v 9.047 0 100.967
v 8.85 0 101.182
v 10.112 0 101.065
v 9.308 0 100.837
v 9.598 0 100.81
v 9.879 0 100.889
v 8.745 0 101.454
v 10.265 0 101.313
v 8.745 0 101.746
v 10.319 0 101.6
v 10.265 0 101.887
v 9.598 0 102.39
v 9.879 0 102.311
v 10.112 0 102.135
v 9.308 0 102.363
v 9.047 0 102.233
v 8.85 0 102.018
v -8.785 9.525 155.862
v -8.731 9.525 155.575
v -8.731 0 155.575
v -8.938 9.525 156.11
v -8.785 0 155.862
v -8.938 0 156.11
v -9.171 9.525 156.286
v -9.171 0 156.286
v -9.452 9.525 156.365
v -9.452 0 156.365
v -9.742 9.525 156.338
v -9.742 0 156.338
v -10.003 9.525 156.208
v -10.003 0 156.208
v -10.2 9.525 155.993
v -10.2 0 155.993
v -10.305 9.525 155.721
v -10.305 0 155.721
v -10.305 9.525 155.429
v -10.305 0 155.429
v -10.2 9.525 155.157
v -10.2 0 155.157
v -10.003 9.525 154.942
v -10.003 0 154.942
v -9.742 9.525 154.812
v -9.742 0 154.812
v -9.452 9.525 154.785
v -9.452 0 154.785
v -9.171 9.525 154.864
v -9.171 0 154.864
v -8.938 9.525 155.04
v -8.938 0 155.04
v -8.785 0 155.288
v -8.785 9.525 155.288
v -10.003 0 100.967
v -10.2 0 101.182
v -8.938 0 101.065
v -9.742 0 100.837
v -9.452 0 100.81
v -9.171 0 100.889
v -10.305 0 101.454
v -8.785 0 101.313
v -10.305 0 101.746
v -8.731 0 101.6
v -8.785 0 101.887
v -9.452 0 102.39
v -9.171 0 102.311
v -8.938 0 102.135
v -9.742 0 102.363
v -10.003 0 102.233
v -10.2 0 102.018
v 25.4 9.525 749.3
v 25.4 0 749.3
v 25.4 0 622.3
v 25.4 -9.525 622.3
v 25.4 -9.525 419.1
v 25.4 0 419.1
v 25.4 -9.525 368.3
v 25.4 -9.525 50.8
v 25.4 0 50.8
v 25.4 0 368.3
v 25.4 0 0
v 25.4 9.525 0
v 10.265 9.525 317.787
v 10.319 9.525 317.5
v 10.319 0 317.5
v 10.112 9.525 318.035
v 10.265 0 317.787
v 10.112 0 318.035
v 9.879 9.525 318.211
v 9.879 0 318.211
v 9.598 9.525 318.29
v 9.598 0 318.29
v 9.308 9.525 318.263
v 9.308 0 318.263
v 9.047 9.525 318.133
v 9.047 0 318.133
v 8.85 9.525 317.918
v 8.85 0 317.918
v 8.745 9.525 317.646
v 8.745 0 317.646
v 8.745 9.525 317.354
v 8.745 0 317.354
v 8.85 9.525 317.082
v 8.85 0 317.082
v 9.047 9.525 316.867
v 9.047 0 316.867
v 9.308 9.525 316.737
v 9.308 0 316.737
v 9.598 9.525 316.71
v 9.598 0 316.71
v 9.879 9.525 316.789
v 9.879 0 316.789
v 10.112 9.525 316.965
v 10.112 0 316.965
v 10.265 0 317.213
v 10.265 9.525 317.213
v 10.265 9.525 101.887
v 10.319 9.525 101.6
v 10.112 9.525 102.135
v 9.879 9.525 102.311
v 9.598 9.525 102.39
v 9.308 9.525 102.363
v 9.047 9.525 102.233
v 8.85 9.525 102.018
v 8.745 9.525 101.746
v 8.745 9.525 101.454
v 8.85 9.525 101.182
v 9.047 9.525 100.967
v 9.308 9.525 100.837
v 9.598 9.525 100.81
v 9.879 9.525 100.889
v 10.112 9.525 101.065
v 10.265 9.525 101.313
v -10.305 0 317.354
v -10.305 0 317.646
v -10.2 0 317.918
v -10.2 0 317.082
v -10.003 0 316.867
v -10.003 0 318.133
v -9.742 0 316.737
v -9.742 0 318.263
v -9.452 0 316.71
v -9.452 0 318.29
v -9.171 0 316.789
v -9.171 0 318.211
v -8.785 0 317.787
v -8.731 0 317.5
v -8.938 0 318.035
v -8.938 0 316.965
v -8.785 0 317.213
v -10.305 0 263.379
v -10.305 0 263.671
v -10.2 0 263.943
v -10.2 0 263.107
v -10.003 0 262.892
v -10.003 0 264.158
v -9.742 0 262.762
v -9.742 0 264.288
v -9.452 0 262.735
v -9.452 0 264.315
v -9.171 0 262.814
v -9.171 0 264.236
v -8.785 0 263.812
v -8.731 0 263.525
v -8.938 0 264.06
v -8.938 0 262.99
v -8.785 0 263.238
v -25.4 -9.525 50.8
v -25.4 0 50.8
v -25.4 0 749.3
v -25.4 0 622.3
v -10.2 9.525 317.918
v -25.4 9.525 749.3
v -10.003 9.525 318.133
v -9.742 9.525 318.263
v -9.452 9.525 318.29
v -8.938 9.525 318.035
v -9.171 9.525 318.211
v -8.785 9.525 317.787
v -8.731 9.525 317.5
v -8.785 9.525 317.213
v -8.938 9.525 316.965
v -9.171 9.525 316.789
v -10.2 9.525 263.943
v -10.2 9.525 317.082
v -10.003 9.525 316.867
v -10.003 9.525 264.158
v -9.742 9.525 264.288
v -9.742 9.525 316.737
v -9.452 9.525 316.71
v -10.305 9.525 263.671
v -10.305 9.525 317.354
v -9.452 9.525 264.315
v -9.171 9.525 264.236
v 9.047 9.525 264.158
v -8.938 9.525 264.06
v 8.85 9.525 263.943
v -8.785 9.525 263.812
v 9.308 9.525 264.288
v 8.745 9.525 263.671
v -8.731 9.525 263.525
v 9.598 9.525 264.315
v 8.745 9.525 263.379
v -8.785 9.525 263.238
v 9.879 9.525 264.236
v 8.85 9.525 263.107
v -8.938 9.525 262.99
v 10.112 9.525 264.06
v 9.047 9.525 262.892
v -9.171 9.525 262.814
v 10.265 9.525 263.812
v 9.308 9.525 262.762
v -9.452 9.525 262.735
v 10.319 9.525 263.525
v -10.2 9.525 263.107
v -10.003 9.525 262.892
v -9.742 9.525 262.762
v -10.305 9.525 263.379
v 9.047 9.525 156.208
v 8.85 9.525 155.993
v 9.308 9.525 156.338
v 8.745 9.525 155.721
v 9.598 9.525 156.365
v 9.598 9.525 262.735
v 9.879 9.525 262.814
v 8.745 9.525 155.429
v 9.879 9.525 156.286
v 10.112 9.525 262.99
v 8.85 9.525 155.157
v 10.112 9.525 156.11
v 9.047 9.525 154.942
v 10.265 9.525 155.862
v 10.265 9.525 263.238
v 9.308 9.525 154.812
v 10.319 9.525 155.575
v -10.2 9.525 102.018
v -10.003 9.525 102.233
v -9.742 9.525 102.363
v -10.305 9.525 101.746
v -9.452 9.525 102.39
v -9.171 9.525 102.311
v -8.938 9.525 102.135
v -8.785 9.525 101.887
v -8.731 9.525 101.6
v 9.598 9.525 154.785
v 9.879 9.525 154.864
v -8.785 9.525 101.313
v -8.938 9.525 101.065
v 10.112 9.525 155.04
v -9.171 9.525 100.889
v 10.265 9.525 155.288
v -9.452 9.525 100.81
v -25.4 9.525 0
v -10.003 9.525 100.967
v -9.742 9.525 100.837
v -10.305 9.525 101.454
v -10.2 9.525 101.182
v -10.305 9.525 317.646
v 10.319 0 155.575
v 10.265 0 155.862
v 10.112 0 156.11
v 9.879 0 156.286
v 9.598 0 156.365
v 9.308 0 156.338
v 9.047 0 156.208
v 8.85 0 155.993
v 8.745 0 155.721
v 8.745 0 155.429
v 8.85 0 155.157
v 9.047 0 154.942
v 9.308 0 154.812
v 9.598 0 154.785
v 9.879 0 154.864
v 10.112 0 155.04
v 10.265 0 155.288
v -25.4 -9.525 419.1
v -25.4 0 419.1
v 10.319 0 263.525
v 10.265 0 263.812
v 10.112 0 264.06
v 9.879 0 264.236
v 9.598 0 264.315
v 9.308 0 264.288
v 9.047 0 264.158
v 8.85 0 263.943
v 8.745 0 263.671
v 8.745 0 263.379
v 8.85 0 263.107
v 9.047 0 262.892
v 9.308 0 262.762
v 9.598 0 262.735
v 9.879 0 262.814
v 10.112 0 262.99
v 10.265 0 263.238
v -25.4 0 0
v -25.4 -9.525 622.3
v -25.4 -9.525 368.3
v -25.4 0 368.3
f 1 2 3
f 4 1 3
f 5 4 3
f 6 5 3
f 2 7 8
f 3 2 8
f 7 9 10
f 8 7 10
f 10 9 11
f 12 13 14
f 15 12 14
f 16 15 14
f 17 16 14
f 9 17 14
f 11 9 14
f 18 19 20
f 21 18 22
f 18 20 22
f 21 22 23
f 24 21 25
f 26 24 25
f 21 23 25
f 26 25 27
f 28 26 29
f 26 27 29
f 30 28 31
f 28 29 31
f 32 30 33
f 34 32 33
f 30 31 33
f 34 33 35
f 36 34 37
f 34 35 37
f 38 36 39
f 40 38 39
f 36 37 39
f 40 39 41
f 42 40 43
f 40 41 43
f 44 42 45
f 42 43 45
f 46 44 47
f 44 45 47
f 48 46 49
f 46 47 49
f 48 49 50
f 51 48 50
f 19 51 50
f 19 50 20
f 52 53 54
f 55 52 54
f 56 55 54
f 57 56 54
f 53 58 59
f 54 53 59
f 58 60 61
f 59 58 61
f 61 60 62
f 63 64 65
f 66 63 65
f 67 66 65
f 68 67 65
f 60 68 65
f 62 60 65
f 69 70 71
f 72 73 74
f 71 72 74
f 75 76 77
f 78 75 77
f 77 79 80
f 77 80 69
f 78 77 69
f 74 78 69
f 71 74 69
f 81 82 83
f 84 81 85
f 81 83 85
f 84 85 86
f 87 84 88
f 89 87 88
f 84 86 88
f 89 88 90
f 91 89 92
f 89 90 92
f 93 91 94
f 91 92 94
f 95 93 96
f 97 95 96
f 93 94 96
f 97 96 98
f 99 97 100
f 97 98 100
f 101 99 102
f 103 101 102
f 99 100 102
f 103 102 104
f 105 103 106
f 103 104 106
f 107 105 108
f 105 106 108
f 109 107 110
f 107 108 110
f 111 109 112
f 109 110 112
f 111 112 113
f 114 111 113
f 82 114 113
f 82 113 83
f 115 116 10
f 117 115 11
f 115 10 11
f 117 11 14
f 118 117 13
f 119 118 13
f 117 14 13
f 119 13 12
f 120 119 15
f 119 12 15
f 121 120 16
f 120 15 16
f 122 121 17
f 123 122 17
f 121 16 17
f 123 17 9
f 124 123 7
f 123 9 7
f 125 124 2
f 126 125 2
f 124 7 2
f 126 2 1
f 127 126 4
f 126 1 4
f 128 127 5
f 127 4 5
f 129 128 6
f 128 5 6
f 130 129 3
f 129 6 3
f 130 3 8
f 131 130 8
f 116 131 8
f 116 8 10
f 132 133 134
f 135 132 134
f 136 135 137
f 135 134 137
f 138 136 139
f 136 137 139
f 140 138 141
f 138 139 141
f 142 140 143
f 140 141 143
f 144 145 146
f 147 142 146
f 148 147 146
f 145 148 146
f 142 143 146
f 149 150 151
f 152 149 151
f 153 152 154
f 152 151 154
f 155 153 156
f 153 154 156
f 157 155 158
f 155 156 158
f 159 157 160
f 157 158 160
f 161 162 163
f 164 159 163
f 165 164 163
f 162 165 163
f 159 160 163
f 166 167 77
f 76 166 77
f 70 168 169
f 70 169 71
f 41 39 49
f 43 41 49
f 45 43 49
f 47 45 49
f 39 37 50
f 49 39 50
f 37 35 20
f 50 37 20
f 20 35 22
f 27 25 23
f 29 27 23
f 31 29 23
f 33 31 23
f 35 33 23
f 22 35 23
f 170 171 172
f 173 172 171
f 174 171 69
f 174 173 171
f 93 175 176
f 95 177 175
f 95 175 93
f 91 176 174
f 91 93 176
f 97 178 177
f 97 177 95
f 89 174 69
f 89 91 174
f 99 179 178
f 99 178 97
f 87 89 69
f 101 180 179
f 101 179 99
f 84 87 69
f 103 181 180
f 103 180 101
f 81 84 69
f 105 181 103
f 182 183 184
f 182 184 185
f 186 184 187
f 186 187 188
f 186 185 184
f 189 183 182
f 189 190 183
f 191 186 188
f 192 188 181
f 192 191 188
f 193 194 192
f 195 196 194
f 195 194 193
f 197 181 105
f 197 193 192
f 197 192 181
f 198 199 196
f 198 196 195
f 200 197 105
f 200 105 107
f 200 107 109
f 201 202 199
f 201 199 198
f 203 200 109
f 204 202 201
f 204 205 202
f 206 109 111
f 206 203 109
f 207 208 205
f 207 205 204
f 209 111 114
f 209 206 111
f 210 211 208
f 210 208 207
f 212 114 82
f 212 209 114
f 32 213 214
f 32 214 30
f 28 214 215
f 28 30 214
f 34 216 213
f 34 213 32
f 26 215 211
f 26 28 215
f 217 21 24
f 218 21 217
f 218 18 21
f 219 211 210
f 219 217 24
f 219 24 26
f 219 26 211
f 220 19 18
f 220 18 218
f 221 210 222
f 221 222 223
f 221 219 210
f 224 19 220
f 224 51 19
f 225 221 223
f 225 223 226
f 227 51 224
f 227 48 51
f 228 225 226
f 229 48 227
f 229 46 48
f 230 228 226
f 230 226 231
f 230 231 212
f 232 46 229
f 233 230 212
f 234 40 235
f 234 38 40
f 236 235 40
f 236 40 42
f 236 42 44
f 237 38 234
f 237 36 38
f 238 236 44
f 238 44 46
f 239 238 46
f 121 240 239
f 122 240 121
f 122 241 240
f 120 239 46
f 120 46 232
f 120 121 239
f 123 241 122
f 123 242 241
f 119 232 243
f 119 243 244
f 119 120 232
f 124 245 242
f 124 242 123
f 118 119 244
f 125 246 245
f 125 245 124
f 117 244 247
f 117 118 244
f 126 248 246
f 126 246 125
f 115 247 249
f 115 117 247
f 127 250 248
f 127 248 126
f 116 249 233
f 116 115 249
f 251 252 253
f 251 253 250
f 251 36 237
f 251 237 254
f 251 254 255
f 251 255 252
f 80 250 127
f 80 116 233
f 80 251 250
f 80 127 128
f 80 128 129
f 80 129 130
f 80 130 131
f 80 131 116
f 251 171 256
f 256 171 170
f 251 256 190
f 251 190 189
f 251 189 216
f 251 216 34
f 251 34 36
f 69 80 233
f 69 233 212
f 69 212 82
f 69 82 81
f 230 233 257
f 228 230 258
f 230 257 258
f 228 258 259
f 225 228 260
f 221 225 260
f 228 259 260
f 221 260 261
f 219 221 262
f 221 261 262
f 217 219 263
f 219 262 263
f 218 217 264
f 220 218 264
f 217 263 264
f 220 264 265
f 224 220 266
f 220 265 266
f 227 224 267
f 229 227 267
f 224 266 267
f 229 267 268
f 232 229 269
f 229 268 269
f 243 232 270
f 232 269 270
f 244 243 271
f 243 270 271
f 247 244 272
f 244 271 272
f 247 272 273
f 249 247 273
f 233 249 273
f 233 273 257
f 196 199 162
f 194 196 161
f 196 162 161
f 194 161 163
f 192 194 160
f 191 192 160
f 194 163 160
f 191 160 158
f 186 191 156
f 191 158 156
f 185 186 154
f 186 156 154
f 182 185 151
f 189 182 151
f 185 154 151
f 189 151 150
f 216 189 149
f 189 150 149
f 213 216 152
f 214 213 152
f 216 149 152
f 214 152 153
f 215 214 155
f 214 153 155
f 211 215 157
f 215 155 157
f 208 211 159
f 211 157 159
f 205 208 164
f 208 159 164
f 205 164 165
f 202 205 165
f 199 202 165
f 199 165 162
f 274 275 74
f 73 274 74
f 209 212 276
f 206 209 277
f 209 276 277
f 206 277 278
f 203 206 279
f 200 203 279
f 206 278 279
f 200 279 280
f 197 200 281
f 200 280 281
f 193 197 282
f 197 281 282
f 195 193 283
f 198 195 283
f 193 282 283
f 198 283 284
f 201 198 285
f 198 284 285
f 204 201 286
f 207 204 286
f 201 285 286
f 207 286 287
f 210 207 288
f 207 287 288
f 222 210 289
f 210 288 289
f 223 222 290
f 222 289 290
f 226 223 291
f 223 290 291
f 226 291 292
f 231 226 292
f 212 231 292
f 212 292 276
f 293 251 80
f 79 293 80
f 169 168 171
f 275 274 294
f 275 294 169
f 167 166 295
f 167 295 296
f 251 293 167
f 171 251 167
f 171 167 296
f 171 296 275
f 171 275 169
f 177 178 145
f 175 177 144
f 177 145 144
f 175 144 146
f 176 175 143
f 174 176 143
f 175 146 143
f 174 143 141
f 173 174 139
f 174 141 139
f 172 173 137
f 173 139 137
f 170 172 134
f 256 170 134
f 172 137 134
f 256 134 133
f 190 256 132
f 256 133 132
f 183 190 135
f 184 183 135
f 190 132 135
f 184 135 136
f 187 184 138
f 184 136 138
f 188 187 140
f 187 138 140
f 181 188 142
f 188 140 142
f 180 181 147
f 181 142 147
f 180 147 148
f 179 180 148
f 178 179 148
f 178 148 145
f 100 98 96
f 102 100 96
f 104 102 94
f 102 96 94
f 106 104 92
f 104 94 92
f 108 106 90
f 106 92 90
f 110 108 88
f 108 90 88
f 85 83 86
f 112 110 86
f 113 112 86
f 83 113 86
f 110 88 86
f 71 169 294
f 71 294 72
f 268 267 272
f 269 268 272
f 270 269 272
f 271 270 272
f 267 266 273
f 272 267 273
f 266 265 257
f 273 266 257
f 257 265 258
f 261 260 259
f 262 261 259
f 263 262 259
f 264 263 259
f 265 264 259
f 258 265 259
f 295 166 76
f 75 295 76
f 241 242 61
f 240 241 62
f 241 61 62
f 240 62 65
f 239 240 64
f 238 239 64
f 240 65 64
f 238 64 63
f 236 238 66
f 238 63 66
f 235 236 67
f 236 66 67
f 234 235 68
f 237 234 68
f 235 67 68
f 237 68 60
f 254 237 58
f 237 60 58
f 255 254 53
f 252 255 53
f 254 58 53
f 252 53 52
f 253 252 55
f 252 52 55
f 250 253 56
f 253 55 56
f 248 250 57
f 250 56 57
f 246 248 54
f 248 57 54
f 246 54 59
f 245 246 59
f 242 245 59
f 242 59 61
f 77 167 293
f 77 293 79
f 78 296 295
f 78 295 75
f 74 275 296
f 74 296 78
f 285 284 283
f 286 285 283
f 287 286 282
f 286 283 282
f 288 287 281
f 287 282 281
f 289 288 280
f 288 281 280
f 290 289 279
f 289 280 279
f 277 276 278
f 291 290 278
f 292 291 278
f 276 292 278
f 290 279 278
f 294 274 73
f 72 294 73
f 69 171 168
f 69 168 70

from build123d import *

# Parameters (mm, degrees)
F0_W     = 50.8
F0_H     = 19.05
F1_DEPTH = 749.3
F2_W     = 122.435573
F2_H     = 50.8
F2_W_2   = 93.867282
F2_W_3   = 343.160421
F2_H_2   = 127
F3_DEPTH = 25.4
F4_R     = 0.79375
F5_DEPTH = 25.4


with BuildPart() as f1:
    # F0 (on Top) → F1 (new body)
    with BuildSketch(Plane.XY):
        Rectangle(F0_W, F0_H)
    extrude(amount=F1_DEPTH)

    # F2 (on Front) → F3 (cut)
    with BuildSketch(Plane.XZ):
        with Locations((22.446524, 25.4)):
            Rectangle(F2_W, F2_H)
        with Locations((2.720783, 393.7)):
            Rectangle(F2_W_2, F2_H)
        with Locations((-38.781822, 685.8)):
            Rectangle(F2_W_3, F2_H_2)
    extrude(amount=F3_DEPTH, mode=Mode.SUBTRACT)

    # F4 (on Front) → F5 (cut)
    with BuildSketch(Plane.XZ):
        with Locations((9.525, 101.6)):
            Circle(F4_R)
        with Locations((9.525, 155.575)):
            Circle(F4_R)
        with Locations((9.525, 263.525)):
            Circle(F4_R)
        with Locations((9.525, 317.5)):
            Circle(F4_R)
        with Locations((-9.525, 263.525)):
            Circle(F4_R)
        with Locations((-9.525, 317.5)):
            Circle(F4_R)
        with Locations((-9.525, 101.6)):
            Circle(F4_R)
        with Locations((-9.525, 155.575)):
            Circle(F4_R)
    extrude(amount=-F5_DEPTH, mode=Mode.SUBTRACT)


solid = f1.part
